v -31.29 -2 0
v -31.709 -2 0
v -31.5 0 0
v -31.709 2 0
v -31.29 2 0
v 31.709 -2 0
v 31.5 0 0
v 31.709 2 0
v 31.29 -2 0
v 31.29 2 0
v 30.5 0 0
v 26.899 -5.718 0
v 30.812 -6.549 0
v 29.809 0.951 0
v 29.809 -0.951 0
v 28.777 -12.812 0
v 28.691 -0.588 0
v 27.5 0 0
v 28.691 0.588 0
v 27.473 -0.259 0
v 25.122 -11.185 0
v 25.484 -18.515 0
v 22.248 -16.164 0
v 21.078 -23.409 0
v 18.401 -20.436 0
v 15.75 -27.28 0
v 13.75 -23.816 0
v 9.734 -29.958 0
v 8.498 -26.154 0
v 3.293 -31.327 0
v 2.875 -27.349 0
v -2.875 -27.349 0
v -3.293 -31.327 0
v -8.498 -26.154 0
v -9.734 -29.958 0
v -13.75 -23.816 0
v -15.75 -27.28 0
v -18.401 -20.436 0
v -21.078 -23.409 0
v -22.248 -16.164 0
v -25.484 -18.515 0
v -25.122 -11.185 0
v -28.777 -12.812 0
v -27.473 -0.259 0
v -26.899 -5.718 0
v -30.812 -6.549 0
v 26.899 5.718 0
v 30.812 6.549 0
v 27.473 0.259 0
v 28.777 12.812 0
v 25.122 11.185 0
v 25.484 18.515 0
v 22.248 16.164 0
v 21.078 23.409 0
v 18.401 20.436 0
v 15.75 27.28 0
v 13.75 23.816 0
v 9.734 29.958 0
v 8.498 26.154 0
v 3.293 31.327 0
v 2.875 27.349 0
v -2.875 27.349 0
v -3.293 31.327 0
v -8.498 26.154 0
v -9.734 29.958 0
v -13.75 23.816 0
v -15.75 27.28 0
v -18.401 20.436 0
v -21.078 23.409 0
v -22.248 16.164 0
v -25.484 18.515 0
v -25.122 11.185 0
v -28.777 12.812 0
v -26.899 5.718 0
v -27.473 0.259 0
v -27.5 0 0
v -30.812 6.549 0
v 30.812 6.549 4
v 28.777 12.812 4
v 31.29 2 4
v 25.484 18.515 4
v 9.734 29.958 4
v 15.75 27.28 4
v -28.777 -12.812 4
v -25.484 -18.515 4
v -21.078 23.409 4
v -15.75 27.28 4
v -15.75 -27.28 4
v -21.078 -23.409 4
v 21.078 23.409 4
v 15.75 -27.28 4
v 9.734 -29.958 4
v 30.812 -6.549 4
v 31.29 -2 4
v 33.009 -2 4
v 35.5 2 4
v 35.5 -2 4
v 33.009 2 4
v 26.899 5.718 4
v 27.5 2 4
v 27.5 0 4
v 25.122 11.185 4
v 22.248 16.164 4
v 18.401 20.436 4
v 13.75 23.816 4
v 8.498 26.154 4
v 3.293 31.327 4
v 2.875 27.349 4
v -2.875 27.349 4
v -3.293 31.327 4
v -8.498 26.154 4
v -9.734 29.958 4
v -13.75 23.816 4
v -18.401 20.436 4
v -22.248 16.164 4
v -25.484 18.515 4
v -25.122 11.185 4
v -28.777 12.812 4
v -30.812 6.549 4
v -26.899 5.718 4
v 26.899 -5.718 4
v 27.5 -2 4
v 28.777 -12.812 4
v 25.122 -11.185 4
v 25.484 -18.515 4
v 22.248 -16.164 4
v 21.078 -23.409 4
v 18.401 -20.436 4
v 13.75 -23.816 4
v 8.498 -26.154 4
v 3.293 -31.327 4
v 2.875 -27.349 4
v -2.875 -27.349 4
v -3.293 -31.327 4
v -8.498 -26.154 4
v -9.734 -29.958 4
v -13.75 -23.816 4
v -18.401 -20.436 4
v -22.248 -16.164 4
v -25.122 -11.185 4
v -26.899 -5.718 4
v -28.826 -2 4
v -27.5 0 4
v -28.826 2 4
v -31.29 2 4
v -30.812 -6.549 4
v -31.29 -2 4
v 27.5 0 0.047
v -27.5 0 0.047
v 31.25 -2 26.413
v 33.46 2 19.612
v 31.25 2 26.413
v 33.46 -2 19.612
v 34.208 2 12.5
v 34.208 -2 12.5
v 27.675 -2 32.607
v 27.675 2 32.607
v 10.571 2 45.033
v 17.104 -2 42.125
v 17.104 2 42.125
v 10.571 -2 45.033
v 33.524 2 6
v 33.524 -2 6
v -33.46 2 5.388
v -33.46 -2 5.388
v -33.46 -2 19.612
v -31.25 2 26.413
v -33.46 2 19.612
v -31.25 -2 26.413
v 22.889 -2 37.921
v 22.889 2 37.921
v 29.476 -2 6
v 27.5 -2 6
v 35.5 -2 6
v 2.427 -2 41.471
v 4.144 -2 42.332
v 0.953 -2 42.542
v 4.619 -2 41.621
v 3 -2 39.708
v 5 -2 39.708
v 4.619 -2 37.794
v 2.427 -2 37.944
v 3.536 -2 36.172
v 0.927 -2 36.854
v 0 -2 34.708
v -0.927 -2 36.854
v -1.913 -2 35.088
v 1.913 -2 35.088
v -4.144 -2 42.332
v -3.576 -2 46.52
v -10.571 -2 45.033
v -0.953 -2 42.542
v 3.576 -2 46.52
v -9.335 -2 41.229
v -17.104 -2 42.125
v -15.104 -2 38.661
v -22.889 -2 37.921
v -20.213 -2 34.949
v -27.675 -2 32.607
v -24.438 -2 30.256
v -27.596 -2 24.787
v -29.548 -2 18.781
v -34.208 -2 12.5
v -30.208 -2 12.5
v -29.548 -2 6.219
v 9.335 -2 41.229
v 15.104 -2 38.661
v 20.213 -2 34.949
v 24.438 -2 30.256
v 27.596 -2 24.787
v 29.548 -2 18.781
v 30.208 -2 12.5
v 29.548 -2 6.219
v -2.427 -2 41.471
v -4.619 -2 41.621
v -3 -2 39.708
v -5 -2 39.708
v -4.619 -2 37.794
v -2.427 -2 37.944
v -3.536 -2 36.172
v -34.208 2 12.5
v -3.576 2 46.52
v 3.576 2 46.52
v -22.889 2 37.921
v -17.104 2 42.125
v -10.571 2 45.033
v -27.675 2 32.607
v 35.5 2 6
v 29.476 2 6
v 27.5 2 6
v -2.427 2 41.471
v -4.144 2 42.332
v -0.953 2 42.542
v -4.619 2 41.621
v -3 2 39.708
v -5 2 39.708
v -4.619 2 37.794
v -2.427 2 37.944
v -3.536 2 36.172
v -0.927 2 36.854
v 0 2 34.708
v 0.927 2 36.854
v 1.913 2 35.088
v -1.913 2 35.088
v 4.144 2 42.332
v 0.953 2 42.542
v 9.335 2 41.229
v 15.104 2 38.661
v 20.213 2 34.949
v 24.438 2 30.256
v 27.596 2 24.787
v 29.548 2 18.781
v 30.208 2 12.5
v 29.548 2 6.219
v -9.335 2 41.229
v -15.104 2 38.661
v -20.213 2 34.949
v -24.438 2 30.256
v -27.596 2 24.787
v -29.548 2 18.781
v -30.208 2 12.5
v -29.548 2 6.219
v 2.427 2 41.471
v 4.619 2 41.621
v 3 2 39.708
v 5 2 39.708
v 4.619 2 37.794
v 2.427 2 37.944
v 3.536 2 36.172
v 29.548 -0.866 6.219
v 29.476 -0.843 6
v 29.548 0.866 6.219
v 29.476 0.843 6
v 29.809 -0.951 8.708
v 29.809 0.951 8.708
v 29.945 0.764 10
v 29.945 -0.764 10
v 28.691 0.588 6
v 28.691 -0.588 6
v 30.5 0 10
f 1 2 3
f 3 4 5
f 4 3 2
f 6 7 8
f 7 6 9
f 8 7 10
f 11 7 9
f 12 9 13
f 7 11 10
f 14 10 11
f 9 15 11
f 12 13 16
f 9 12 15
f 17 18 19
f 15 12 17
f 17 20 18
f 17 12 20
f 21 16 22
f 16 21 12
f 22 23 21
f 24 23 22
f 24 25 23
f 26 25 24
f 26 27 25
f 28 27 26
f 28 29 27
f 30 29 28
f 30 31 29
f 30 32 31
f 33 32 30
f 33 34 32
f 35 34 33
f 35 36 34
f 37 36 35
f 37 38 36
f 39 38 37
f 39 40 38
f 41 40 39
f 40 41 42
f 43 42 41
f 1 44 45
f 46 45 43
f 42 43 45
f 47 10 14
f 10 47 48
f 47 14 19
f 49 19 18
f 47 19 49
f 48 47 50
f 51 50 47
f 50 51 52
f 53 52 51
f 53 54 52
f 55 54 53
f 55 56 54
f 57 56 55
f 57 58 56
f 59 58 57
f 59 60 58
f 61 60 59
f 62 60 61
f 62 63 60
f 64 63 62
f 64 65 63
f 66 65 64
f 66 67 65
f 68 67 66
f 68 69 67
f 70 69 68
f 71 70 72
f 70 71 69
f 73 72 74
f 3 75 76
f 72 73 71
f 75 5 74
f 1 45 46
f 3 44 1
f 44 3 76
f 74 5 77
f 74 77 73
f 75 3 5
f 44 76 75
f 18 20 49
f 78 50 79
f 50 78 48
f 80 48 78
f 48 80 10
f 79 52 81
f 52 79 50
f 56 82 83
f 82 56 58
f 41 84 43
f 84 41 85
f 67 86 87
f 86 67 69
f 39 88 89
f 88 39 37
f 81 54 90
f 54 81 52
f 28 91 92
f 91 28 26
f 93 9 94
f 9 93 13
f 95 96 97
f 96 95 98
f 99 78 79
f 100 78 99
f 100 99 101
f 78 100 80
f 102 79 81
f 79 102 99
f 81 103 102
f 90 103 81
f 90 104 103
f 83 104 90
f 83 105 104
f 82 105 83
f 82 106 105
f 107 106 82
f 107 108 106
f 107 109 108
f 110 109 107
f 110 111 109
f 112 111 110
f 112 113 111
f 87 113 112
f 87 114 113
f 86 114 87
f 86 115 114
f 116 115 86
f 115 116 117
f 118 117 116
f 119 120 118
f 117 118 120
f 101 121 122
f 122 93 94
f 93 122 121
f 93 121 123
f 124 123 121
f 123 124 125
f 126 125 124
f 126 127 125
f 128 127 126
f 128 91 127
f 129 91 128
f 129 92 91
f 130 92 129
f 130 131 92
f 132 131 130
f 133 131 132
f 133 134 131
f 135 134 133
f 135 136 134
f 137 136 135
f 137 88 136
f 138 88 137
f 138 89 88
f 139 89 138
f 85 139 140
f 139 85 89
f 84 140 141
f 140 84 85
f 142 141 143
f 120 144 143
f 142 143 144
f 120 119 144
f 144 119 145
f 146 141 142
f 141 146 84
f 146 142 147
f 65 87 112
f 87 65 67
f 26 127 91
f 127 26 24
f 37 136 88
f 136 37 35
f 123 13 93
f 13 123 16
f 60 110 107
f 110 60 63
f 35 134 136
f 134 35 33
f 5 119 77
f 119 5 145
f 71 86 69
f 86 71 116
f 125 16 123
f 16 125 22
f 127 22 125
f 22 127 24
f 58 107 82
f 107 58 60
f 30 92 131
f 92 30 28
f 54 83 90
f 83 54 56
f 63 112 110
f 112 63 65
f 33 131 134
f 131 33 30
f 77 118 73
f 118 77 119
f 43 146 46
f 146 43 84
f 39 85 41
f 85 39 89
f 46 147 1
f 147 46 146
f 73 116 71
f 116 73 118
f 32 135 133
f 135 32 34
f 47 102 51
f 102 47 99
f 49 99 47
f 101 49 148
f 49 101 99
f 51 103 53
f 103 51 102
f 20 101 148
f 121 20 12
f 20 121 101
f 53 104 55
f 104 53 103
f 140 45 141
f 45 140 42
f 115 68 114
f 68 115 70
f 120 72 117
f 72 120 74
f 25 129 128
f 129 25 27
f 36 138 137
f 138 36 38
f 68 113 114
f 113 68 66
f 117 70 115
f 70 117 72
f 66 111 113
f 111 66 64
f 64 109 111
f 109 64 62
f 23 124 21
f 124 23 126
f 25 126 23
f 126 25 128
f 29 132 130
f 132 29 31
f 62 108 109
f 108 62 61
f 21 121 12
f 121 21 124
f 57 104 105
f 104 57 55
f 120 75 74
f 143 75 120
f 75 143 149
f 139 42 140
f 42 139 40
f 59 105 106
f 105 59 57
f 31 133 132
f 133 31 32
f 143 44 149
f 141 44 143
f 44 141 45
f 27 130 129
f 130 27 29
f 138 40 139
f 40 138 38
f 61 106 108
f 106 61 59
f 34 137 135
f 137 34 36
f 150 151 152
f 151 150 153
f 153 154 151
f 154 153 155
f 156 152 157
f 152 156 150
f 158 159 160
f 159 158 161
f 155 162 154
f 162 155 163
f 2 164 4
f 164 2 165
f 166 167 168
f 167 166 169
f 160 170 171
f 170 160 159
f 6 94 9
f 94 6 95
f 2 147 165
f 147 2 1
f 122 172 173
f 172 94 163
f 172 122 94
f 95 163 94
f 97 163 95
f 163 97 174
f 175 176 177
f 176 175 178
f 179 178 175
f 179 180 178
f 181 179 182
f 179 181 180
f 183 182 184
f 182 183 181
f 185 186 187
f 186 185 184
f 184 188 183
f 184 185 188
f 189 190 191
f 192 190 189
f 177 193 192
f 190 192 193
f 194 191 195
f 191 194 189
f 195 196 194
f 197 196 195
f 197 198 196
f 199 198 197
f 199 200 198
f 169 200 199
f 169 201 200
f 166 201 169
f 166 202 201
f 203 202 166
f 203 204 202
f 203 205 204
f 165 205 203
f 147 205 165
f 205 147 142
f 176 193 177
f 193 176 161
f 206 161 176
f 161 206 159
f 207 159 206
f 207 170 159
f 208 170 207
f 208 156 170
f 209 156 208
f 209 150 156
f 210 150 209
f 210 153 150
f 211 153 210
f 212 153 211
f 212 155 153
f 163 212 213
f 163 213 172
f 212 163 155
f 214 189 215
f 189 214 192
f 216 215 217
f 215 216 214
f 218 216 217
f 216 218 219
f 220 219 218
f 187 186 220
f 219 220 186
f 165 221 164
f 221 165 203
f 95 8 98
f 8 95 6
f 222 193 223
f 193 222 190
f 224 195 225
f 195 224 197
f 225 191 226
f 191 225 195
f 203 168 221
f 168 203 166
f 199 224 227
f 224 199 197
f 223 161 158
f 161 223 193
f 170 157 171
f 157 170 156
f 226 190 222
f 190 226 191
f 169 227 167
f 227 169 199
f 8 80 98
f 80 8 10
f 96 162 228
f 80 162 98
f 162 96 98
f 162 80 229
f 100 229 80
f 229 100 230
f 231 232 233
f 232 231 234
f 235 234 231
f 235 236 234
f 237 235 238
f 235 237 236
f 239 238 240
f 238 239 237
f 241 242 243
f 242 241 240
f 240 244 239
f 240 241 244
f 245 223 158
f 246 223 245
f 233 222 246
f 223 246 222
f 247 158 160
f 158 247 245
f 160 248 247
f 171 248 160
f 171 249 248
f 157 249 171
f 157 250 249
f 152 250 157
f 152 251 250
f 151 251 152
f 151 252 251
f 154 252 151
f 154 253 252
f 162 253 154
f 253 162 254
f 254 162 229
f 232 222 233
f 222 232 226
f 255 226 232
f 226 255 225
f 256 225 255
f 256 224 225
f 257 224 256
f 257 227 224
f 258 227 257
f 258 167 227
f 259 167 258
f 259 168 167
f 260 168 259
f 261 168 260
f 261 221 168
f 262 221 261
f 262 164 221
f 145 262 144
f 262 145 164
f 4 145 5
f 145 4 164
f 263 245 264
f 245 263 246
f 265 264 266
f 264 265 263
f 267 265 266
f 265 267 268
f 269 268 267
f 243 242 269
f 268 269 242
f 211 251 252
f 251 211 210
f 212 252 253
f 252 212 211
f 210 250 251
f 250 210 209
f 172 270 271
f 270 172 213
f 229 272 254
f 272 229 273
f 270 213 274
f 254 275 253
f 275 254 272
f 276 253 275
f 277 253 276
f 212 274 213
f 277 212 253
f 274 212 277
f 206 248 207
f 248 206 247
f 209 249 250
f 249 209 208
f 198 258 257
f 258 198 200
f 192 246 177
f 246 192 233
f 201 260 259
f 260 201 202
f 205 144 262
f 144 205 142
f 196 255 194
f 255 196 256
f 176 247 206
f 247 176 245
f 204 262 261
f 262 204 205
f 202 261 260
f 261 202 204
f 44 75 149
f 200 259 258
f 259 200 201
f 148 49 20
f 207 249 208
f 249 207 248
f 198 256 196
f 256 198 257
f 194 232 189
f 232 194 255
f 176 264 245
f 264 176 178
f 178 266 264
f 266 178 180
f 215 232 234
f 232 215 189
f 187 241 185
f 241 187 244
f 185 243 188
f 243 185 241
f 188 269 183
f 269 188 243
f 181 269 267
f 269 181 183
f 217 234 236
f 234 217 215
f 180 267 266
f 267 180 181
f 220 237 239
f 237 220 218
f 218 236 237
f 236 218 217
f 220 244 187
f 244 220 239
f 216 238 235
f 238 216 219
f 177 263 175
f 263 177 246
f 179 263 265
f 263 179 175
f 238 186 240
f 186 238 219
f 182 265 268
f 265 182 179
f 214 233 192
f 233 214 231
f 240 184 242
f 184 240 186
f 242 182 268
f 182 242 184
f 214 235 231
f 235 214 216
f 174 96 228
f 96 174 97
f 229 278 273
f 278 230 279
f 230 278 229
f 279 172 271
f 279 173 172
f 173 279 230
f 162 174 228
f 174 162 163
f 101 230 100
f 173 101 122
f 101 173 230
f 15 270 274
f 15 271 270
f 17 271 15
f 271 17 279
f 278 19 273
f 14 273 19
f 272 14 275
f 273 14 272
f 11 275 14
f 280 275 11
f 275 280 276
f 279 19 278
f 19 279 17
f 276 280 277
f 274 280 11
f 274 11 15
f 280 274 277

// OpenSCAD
difference() {
	union() {
		difference() {
			cylinder(d = 63, h = 4);
			translate(v = [0, 0, -2.0000000000]) {
				cylinder(d = 55, h = 8);
			}
		}
		difference() {
			translate(v = [0, 2.0000000000, 0]) {
				translate(v = [0, 0, 12.5000000000]) {
					rotate(a = [90, 0, 0]) {
						union() {
							difference() {
								cylinder(d = 68.4152298680, h = 4);
								translate(v = [0, 0, -2.0000000000]) {
									cylinder(d = 60.4152298680, h = 8);
								}
							}
							translate(v = [0, 27.2076149340, 0]) {
								difference() {
									cylinder(d = 10, h = 4);
									translate(v = [0, 0, -2.0000000000]) {
										cylinder(d = 6, h = 8);
									}
								}
							}
						}
					}
				}
			}
			translate(v = [0, 0, -500]) {
				cube(center = true, size = [1000, 1000, 1000]);
			}
		}
		translate(v = [31.5000000000, 0, 0]) {
			translate(v = [0, 0, 5.0000000000]) {
				cube(center = true, size = [8, 4, 2]);
			}
		}
	}
	translate(v = [29.5000000000, 0, 0]) {
		cylinder(d = 2, h = 10);
	}
}
